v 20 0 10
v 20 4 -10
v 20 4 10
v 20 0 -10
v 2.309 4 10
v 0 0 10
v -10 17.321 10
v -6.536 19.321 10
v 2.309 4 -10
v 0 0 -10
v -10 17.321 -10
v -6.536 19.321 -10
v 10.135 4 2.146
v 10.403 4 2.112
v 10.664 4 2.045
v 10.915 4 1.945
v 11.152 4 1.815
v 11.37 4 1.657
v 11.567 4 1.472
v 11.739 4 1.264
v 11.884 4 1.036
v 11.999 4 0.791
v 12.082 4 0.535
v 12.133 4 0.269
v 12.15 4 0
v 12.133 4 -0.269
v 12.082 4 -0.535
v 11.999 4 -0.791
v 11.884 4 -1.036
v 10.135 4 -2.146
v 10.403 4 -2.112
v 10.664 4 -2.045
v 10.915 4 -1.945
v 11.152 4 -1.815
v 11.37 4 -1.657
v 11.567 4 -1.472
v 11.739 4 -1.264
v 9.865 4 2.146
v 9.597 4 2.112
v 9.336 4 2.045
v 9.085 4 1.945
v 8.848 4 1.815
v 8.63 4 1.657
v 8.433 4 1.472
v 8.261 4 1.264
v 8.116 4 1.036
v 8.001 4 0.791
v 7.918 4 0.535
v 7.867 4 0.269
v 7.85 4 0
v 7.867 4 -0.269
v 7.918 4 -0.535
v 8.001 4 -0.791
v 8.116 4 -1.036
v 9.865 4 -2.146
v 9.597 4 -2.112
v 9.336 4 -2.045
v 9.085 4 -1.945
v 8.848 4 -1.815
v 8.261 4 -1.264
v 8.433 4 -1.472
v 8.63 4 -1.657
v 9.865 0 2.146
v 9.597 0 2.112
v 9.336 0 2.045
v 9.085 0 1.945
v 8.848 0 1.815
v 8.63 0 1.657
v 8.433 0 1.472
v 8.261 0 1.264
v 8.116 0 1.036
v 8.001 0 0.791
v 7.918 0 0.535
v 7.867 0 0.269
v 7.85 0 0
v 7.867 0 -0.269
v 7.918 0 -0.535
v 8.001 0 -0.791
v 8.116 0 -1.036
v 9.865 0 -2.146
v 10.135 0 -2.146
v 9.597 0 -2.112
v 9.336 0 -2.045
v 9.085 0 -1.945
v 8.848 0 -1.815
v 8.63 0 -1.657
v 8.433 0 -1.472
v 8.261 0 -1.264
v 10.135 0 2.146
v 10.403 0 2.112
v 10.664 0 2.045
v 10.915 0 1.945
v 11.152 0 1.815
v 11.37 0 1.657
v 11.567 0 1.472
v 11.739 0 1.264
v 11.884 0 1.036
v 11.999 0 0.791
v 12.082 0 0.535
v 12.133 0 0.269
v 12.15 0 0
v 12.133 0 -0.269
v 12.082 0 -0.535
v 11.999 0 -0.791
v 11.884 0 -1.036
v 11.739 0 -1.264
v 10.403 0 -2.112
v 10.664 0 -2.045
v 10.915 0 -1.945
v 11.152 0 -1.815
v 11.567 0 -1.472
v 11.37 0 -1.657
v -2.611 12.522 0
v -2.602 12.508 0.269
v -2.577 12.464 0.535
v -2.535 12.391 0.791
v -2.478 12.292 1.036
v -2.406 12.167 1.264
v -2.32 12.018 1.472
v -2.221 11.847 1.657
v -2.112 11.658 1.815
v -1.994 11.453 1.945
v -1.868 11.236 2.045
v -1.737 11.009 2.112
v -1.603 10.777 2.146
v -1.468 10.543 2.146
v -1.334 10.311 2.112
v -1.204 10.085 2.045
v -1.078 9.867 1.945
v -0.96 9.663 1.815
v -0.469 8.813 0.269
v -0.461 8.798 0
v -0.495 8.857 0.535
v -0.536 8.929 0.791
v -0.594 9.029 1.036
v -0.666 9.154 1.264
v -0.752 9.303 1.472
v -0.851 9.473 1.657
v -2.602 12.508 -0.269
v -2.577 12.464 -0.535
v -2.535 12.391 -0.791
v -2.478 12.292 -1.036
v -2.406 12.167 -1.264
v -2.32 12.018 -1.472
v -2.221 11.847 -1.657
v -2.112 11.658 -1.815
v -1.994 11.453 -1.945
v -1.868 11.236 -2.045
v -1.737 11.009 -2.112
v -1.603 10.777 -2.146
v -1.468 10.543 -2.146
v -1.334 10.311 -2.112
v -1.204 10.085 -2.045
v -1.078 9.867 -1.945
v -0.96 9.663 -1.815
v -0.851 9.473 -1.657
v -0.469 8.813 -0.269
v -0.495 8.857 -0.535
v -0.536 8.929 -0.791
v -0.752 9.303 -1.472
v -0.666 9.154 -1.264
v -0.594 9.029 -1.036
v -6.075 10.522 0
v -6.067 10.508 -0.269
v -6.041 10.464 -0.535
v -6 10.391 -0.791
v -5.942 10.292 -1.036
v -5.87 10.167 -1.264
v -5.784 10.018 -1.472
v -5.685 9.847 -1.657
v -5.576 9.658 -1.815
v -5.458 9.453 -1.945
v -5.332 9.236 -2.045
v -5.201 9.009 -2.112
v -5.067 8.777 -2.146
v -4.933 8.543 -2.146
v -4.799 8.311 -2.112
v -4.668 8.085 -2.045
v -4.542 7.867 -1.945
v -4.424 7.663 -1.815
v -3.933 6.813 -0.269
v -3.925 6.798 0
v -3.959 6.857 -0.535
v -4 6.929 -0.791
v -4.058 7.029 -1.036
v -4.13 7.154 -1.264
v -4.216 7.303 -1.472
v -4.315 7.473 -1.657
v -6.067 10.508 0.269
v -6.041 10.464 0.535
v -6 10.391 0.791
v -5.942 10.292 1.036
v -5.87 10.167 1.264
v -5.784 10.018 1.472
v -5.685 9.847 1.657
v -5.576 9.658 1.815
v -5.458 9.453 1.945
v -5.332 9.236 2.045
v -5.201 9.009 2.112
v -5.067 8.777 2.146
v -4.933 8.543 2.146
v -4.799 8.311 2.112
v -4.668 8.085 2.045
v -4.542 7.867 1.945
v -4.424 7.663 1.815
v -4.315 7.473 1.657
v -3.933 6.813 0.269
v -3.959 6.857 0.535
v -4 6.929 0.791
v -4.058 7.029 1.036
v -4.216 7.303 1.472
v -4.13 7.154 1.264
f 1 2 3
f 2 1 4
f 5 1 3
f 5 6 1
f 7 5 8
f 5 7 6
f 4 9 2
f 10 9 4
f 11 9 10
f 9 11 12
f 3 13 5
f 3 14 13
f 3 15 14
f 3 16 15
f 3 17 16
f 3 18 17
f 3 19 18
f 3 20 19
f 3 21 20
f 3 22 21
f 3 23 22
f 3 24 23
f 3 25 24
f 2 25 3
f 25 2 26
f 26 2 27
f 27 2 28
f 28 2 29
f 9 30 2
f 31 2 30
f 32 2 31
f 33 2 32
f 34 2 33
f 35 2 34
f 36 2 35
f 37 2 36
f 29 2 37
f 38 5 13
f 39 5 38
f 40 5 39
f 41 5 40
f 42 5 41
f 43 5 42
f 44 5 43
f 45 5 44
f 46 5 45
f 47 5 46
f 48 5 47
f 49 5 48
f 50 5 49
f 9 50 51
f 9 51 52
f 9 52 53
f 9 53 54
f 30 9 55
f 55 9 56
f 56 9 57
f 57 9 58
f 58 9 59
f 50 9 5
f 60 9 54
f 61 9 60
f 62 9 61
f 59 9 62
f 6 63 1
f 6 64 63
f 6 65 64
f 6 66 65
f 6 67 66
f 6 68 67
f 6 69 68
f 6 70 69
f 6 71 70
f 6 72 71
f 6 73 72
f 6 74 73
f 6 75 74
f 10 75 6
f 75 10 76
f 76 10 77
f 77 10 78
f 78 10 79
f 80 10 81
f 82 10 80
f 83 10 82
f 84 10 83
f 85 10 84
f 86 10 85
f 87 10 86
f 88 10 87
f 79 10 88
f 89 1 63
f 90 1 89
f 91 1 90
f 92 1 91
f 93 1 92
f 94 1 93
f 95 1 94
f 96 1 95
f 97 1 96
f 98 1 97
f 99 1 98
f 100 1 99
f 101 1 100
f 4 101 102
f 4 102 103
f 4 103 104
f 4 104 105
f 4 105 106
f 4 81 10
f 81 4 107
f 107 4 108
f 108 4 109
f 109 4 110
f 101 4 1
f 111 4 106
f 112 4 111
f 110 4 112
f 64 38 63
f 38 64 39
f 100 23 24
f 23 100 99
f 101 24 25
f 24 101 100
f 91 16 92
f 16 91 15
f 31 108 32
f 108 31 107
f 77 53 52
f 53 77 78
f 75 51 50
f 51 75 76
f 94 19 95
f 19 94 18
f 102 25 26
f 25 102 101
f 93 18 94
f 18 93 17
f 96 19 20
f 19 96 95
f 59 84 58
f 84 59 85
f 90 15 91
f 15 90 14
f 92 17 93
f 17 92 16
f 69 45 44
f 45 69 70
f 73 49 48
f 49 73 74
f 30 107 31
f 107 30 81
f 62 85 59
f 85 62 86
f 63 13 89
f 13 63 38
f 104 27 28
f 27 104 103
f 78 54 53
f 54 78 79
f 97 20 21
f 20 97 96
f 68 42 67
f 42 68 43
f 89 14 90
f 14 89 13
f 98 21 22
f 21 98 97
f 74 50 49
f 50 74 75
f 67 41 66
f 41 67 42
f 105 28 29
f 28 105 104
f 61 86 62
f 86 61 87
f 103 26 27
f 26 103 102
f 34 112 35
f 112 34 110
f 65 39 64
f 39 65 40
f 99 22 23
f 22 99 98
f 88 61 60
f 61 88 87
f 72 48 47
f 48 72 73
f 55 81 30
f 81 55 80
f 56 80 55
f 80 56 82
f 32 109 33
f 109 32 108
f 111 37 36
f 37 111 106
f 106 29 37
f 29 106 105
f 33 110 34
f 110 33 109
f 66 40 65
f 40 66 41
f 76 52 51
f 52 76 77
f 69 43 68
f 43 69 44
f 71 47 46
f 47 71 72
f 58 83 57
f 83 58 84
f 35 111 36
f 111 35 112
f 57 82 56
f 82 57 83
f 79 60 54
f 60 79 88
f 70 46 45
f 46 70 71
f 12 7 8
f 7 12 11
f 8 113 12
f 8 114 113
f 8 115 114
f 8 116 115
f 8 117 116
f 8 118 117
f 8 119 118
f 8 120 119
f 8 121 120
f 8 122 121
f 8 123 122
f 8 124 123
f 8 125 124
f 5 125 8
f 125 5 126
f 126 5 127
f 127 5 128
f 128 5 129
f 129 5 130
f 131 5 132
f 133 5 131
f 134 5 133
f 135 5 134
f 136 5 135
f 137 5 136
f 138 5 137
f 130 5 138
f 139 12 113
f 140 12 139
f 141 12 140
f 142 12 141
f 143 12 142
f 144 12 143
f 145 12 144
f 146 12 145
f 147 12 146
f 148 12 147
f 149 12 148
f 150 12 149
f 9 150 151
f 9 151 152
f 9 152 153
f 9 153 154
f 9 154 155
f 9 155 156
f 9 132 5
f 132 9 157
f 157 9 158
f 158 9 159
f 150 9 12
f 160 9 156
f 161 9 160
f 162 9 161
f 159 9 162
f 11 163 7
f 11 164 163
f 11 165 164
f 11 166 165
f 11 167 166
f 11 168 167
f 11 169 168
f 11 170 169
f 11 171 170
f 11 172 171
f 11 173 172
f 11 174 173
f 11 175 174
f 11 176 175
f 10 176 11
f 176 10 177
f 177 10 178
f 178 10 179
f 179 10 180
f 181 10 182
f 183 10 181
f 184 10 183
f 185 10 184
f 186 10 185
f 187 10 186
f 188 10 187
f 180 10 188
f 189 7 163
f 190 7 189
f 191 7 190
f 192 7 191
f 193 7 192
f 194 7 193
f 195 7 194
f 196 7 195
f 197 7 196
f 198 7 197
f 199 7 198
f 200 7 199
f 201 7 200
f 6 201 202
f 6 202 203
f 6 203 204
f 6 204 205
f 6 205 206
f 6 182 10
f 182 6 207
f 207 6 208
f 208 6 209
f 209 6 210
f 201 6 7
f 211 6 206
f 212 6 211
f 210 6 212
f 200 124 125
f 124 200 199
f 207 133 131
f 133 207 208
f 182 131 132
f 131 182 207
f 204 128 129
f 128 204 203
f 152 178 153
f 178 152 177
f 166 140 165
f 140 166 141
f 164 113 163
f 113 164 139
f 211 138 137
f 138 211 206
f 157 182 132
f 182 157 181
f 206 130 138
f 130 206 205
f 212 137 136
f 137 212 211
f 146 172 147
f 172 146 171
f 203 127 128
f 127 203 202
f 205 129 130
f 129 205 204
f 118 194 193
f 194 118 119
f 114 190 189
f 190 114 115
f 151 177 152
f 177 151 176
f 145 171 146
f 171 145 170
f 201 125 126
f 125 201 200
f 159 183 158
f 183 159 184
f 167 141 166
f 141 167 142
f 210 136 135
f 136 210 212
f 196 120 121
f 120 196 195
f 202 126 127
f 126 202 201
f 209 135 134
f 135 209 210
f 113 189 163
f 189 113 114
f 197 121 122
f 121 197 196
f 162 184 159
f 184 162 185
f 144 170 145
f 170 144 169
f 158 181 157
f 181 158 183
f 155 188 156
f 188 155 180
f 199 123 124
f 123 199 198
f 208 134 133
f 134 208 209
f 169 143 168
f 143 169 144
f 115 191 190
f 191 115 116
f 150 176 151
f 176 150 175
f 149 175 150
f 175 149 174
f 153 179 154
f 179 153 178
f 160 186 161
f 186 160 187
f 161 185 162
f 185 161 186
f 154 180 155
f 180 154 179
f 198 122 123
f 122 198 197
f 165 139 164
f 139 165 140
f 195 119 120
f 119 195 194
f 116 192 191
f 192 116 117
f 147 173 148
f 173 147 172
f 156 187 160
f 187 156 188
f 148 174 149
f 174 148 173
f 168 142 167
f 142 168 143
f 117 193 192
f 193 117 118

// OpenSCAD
// file: configuration.scad
// OD = outside diameter, corner to corner.
m3_nut_od = 6.1;
m3_nut_radius = (m3_nut_od+0.2)/2;

m4_nut_od = 8.1;
m4_nut_radius = (m4_nut_od+0.2)/2;

// Major diameter of metric 3mm thread.
m3_major = 2.85;
m3_radius = m3_major/2;
m3_open_radius = 3.2/2;

m4_major = 3.85;
m4_radius = m4_major/2;
m4_open_radius = 4.3/2;

m8_major = 7.85;
m8_radius = m8_major/2;
m8_open_radius = 8.3/2;

// NEMA17 stepper motors.
motor_shaft_diameter = 5;
motor_shaft_radius = (motor_shaft_diameter+0.3)/2;

// Frame brackets.
thickness = 3.6;

tower_radius = 185;
tower_side = tower_radius*1.73205;
tower_h = tower_radius*1.5;
tower_height = 1000;
bearing_spacing = 39.8;
horizontal_beam_radius = (tower_radius+28.8)/2;
horizontal_beam_length = horizontal_beam_radius * 3.464101615138 - (41.35*2);

color_a = "GreenYellow";
color_b = "black";
color_c = "";
color_d = "Silver";
// main file
include <configuration.scad>

translate([10,2,0]) difference() {
	cube([20,4,20], center=true);
	rotate([90,0,0]) cylinder(r=m4_open_radius,h=10,$fn=50,center=true);
}
rotate([0,0,-60]) translate([-10,2,0]) difference() { 
	cube([20,4,20], center=true);
	rotate([90,0,0]) cylinder(r=m4_open_radius,h=10,$fn=50,center=true);
}
